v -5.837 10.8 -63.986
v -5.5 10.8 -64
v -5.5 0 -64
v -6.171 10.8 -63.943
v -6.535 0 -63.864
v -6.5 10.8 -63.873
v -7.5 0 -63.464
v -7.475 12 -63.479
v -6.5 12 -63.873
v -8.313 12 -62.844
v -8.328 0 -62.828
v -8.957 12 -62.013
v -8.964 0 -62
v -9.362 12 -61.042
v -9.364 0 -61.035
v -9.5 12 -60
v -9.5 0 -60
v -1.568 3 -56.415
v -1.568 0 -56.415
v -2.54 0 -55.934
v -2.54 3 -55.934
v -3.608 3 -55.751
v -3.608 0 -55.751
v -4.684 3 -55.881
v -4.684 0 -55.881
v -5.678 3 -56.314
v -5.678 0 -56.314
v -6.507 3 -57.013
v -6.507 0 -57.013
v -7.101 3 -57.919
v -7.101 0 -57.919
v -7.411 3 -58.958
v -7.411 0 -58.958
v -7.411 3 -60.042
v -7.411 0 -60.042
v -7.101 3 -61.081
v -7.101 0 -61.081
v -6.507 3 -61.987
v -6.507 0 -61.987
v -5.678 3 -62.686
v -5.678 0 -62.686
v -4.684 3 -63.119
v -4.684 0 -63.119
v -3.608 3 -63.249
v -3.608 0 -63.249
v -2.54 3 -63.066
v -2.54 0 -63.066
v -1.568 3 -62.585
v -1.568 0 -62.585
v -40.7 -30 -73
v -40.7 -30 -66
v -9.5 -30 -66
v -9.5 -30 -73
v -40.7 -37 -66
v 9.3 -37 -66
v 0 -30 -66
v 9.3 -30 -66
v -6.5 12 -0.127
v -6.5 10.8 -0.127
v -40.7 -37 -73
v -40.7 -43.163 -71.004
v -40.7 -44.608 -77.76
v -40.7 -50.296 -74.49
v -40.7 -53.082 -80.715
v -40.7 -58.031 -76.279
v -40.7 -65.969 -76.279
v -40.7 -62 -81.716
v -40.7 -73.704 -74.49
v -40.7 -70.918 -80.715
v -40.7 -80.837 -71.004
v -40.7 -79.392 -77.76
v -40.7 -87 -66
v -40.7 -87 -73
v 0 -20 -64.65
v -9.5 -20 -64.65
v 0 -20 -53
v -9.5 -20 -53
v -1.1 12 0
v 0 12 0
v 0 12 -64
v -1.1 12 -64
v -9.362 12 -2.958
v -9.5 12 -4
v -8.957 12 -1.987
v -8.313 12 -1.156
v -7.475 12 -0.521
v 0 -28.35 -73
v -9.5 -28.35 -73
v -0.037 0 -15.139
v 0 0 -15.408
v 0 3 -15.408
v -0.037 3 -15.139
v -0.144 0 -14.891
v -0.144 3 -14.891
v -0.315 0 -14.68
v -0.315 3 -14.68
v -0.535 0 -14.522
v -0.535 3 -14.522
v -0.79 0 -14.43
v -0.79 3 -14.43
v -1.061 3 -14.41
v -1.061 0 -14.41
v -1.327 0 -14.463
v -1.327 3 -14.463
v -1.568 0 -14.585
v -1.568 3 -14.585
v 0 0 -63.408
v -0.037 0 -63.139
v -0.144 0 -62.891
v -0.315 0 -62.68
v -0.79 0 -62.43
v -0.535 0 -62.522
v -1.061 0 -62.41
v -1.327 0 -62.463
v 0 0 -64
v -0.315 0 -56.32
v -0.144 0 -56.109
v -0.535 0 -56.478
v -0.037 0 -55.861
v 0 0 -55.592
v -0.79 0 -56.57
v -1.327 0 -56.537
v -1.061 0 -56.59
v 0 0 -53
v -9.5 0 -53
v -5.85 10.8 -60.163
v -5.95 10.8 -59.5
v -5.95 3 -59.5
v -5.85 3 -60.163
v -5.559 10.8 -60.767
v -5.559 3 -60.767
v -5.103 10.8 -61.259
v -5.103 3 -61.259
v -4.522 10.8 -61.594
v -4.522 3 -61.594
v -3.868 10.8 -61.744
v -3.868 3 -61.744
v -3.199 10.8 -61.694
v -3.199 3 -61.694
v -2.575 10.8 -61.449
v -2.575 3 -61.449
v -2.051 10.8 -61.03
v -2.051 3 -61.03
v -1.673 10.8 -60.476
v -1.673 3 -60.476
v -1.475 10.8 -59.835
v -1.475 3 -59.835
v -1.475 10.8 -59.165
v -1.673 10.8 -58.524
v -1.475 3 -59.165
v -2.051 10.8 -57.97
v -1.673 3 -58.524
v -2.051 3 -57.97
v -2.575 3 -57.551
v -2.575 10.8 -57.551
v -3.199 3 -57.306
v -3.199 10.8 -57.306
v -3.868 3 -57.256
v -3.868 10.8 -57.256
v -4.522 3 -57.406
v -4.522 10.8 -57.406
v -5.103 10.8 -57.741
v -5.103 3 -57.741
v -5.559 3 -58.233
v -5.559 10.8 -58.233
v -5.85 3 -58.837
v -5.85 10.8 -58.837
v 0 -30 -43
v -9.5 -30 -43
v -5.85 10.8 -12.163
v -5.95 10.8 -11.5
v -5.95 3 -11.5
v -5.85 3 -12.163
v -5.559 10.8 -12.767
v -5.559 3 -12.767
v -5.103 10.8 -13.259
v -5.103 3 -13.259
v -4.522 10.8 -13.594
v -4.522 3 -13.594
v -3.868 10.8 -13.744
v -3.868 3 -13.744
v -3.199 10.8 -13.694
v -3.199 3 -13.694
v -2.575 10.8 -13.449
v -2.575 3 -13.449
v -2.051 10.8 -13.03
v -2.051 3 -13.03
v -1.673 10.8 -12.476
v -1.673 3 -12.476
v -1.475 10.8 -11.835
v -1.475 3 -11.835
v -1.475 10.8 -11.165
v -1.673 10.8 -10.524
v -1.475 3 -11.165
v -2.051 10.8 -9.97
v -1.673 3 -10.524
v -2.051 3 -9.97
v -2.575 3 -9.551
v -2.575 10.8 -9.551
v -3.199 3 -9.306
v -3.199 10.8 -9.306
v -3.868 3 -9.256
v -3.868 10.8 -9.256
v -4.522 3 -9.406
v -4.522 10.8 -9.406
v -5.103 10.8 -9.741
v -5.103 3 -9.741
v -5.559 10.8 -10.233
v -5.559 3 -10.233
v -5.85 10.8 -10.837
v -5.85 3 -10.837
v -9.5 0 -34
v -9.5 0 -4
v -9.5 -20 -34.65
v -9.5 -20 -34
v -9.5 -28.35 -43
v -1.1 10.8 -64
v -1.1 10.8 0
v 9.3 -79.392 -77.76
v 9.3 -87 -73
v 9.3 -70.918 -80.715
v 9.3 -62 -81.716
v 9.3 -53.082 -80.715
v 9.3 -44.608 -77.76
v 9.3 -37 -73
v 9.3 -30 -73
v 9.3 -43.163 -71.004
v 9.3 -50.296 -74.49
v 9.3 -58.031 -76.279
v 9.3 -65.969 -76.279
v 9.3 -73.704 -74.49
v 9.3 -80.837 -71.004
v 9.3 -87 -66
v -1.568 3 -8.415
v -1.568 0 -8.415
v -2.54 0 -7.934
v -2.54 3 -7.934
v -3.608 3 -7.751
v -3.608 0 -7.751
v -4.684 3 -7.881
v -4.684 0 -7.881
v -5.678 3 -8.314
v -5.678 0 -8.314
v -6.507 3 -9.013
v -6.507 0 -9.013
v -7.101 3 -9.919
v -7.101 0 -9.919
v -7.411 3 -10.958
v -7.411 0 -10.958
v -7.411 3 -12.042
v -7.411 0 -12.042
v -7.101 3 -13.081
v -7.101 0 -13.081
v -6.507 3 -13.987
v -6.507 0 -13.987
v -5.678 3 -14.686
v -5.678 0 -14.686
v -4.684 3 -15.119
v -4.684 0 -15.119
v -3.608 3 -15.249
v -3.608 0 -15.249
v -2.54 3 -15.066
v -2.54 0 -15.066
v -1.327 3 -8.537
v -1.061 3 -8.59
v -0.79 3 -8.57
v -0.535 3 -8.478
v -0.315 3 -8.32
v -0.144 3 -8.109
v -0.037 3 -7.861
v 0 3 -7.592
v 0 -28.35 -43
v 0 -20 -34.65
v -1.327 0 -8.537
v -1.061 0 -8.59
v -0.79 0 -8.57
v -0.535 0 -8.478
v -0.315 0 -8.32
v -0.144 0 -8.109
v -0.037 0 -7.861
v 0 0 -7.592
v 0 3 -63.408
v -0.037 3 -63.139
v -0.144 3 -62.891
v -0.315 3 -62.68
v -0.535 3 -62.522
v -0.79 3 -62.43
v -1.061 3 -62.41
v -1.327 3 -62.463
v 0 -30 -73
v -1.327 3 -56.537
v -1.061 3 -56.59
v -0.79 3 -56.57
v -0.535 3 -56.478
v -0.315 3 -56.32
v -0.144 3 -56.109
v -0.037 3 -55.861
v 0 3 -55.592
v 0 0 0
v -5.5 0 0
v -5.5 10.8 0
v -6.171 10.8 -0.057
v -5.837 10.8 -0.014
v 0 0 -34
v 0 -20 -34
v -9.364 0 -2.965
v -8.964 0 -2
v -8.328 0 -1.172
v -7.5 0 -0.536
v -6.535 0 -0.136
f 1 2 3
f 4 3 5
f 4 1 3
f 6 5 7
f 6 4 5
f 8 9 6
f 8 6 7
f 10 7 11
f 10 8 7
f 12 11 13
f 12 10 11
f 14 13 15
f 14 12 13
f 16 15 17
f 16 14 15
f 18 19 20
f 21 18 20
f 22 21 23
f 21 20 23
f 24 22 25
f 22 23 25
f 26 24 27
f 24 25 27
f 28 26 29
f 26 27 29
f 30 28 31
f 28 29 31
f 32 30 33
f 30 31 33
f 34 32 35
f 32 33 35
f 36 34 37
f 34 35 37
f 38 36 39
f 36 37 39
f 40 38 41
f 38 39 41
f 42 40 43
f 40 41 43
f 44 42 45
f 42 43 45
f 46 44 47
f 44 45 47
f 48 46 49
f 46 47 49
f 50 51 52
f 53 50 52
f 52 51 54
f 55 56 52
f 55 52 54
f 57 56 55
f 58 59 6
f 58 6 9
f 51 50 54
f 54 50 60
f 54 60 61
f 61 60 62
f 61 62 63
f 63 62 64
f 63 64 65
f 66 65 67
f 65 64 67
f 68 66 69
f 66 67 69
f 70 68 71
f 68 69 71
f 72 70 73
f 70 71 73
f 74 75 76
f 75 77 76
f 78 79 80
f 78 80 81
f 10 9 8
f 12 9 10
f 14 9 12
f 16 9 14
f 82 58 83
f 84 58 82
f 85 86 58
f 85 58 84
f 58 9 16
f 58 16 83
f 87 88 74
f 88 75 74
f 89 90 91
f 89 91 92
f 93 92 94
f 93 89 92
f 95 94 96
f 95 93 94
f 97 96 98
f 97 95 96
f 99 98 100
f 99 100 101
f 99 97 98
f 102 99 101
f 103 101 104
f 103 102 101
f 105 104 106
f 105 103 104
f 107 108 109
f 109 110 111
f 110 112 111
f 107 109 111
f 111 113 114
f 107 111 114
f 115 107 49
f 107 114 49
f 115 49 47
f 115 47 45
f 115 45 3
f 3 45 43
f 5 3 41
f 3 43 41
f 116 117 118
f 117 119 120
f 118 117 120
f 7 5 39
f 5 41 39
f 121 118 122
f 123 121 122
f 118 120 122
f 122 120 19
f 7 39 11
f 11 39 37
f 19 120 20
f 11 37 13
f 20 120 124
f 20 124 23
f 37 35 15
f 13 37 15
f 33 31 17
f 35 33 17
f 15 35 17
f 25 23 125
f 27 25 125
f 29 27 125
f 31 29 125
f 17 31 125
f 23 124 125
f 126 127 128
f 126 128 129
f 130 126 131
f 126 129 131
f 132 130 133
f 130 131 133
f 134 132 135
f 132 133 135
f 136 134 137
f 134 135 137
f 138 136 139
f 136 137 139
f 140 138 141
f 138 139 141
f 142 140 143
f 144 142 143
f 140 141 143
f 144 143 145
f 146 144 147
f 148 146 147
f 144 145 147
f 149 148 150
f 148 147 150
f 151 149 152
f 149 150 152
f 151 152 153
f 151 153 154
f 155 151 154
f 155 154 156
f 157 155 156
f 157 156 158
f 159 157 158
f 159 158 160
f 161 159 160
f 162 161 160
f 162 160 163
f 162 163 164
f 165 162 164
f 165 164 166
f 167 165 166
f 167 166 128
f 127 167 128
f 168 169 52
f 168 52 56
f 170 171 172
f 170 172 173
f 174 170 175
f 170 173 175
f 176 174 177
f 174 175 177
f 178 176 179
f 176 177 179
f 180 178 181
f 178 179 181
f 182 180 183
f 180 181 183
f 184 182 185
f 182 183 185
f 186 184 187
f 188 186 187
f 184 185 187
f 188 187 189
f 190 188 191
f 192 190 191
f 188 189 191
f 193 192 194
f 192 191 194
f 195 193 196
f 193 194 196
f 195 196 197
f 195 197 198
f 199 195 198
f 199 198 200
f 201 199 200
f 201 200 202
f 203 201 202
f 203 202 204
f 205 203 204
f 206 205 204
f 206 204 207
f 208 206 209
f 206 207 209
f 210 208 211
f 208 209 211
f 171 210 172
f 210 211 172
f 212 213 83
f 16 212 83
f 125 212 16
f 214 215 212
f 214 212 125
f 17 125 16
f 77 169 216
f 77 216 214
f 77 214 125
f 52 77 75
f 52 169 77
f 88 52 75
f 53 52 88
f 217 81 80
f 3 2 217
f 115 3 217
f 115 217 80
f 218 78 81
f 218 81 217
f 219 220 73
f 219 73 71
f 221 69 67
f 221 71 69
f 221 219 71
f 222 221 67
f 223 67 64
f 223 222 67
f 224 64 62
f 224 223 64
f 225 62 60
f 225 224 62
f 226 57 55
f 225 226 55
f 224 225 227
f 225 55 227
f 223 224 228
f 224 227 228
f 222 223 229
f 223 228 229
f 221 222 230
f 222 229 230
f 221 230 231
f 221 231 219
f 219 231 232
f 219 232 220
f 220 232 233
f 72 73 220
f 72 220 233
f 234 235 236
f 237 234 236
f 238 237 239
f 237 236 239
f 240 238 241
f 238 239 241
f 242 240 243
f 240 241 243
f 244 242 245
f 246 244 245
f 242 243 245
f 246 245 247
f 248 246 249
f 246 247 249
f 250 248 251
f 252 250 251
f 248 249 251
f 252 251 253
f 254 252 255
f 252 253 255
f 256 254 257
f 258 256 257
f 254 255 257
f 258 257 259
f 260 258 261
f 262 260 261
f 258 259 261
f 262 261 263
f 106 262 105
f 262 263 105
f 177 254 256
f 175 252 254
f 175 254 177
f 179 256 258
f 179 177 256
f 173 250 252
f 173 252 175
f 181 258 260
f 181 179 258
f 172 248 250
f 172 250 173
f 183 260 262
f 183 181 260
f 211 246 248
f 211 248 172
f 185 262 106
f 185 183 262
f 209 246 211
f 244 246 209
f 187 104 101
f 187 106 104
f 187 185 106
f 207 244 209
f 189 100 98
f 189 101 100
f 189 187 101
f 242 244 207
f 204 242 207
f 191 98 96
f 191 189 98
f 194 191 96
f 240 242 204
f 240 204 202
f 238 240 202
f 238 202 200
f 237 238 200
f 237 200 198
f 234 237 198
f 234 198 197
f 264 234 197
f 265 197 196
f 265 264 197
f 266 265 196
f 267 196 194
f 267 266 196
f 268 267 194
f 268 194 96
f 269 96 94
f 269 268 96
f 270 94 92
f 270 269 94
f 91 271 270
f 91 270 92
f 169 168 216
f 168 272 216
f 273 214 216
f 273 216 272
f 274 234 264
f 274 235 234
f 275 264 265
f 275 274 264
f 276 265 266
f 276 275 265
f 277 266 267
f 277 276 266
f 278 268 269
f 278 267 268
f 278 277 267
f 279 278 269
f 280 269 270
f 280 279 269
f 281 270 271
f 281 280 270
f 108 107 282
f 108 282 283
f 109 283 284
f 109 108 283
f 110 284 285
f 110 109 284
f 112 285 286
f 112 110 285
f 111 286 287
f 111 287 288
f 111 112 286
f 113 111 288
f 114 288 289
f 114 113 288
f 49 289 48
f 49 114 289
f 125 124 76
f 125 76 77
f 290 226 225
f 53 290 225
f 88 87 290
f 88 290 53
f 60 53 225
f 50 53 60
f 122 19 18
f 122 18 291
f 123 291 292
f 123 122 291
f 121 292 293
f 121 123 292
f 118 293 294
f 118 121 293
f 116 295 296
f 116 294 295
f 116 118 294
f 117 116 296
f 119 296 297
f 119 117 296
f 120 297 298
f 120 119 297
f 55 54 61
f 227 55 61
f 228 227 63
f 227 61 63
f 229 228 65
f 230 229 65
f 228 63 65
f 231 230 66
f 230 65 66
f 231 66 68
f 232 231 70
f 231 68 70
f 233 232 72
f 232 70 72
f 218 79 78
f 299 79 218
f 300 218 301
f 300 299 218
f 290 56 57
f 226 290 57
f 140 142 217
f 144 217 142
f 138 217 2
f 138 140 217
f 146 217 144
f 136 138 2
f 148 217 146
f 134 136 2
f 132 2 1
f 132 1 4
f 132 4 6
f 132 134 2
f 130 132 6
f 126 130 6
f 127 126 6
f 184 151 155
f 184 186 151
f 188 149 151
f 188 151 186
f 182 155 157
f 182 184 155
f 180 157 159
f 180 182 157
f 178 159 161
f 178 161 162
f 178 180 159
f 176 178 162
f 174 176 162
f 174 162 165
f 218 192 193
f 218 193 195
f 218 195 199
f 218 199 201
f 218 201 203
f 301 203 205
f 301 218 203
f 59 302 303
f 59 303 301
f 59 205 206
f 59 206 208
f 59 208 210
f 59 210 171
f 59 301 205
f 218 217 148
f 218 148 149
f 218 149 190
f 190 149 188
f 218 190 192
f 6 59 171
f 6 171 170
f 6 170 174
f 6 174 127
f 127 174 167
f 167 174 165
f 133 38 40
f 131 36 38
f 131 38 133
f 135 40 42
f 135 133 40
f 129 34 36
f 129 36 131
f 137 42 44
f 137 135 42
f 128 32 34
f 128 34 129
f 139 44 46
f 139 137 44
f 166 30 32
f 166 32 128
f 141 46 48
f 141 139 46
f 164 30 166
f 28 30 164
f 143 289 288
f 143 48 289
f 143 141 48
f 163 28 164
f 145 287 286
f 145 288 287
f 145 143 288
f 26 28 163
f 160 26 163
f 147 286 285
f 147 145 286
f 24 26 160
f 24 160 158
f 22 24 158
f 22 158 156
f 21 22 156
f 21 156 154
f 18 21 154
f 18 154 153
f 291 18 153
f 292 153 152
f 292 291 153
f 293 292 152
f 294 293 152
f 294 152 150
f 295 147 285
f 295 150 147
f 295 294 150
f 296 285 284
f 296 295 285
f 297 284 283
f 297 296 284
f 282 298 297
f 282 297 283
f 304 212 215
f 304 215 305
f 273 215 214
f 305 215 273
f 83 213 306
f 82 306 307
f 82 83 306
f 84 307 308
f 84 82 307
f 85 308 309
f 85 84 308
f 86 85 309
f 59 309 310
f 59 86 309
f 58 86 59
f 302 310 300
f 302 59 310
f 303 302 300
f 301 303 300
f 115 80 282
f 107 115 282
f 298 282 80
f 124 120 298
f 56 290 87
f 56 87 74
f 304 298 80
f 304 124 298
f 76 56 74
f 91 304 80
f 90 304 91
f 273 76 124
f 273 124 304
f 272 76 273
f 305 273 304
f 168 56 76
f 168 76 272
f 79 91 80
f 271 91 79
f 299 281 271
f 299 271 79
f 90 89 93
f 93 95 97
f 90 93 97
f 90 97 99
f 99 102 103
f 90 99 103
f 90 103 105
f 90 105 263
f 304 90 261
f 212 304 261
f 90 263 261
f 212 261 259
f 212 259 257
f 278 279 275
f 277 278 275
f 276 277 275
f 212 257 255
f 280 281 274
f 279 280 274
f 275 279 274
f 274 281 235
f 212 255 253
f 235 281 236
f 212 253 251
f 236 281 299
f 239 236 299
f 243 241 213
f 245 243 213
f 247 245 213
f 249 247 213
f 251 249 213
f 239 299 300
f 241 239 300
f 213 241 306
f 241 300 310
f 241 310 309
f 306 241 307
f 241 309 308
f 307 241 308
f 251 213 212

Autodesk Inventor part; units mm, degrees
ref_plane "YZ Plane" through (0, 0, 0) normal (1, 0, 0) x (0, 1, 0)
ref_plane "XZ Plane" through (0, 0, 0) normal (0, 1, 0) x (-1, 0, 0)
ref_plane "XY Plane" through (0, 0, 0) normal (0, 0, 1) x (1, 0, 0)
sketch "Sketch1" plane through (0, 0, 0) normal (0, 1, 0) x (-1, 0, 0)
  line L0 (0, 0) -> (9.5, 0)
  line L1 (9.5, 0) -> (9.5, -64)
  line L2 (9.5, -64) -> (0, -64)
  line L3 (0, -64) -> (0, 0)
  circle A0 centre (3.7, -11.5) radius 2.25
  circle A1 centre (3.7, -59.5) radius 2.25
  line L4 (3.7, -11.5) -> (3.7, -59.5) construction
  dimension "d1" = 9.5
  dimension "d2" = 64
  dimension "d3" = 4.5
  dimension "d4" = 48
  dimension "d6" = 3.7
  dimension "d17" = 4.5
extrude "Extrusion1" add sketch "Sketch1" along normal blind 12
sketch "Sketch2" plane through (-9.5, 0, 0) normal (0, 0, 1) x (1, 0, 0)
  line L0 (9.5, 12) -> (0, 12) projected
  line L1 (3, 12) -> (8.4, 12)
  line L2 (8.4, 12) -> (8.4, 10.8)
  line L3 (8.4, 10.8) -> (3, 10.8)
  line L4 (3, 10.8) -> (3, 12)
  line L5 (9.5, 0) -> (9.5, 12) projected
  line L6 (3.55, 0) -> (8.05, 0) projected
  line L7 (3.55, 12) -> (8.05, 12) projected
  line L8 (9.5, 0) -> (9.5, 12) projected
  line L9 (9.5, 0) -> (9.5, 12) projected
  line L10 (3.55, 12) -> (8.05, 12) projected
  line L11 (3.55, 12) -> (3.55, 0) projected
  line L12 (3.55, 12) -> (8.05, 12) projected
  line L13 (3.55, 0) -> (8.05, 0) projected
  line L14 (3.55, 12) -> (8.05, 12) projected
  line L15 (3.55, 0) -> (8.05, 0) projected
  line L16 (3.55, 12) -> (8.05, 12) projected
  line L17 (3.55, 0) -> (8.05, 0) projected
  dimension "d9" = 1.1
  dimension "d10" = 5.4
  dimension "d11" = 1.2
  dimension "d76" = 12
extrude "Extrusion2" cut sketch "Sketch2" against normal up to next
sketch "Sketch3" plane through (0, 0, 0) normal (0, -1, 0) x (1, 0, 0)
  circle A0 centre (-3.7, -11.5) radius 2.25 projected
  circle A1 centre (-3.7, -11.5) radius 3.75
  circle A2 centre (-3.7, -59.5) radius 2.25 projected
  circle A3 centre (-3.7, -59.5) radius 3.75
  point P0 (0, 0)
  dimension "d14" = 7.5
extrude "Extrusion3" cut sketch "Sketch3" against normal blind 3
fillet "Fillet1" radius 1 4 edges at (0, 1.5, -58.8897) (0, 1.5, -60.1103) (0, 1.5, -10.8897) (0, 1.5, -12.1103)
fillet "Fillet2" radius 4 2 edges at (-9.5, 6, -64) (-9.5, 6, 0)
sketch "Sketch28" plane through (0, 0, 0) normal (0, -1, 0) x (1, 0, 0)
  arc A0 (-1.5684, -56.4147) -> (0, -55.592) centre (-1, -55.592) ccw projected
  line L0 (0, -55.592) -> (0, -53)
  line L1 (0, -15.408) -> (0, -55.592) projected
  line L2 (-9.5, -60) -> (-9.5, -4) projected
  line L3 (0, -53) -> (-9.5, -53)
  line L4 (-9.5, -53) -> (-9.5, -34)
  line L5 (-9.5, -34) -> (0, -34)
  line L6 (0, -34) -> (0, -53)
  point P0 (0, 0)
  point P1 (0, -34)
  dimension "d107" = 2.592
  dimension "d108" = 19
extrude "Extrusion19" add sketch "Sketch28" along normal blind 20
sketch "Sketch40" plane through (0, -20, 0) normal (0, -1, 0) x (1, 0, 0)
  line L0 (0, -53) -> (-9.5, -53) projected
  line L1 (-9.5, -53) -> (-9.5, -73)
  line L2 (-9.5, -73) -> (0, -73)
  line L3 (0, -73) -> (0, -43)
  line L4 (0, 0) -> (0, -64) projected
  line L5 (0, -43) -> (-9.5, -43)
  line L6 (-9.5, -43) -> (-9.5, -53)
  line L7 (-9.5, -43) -> (0, -43)
  line L8 (0, -43) -> (0, -73)
  line L9 (0, -73) -> (-9.5, -73)
  line L10 (-9.5, -73) -> (-9.5, -43)
  dimension "d130" = 20
  dimension "d131" = 30
extrude "Extrusion21" add sketch "Sketch40" along normal blind 10
sketch "Sketch41" plane through (0, 0, -53) normal (0, 0, -1) x (-1, 0, 0)
  point P0 (0, 0)
sketch "Sketch42" plane through (0, -30, 0) normal (0, -1, 0) x (1, 0, 0)
  line L0 (-9.5, -73) -> (0, -73) projected
  line L1 (-9.5, -73) -> (-40.7, -73)
  line L2 (-9.5, -73) -> (21.7, -73) construction
  line L3 (-40.7, -73) -> (-40.7, -66)
  line L4 (-40.7, -66) -> (9.3, -66)
  line L5 (9.3, -66) -> (9.3, -73)
  line L6 (9.3, -73) -> (-9.5, -73)
  point P0 (0, 0)
  point P1 (0, -73)
  dimension "d134" = 31.2
  dimension "d135" = 180
  dimension "d136" = 7
  dimension "d137" = 50
  dimension "d138" = 7
extrude "Extrusion22" add sketch "Sketch42" along normal blind 7
sketch "Sketch43" plane through (-40.7, -30, -73) normal (-1, 0, 0) x (0, 0, 1)
  arc A0 (7, -7) -> (7, -57) centre (31.4949, -32) ccw
  point P0 (73, 30)
  dimension "d141" = 50
  dimension "d142" = 35
sketch "Sketch44" plane through (0, -37, 0) normal (0, -1, 0) x (1, 0, 0)
  line L0 (9.3, -73) -> (9.3, -66) projected
  line L1 (-40.7, -73) -> (-9.5, -73) projected
  line L2 (9.3, -66) -> (-40.7, -66)
  line L3 (-40.7, -66) -> (-40.7, -73)
  line L4 (-40.7, -73) -> (9.3, -73)
  line L5 (9.3, -73) -> (9.3, -66)
  point P0 (0, 0)
  point P1 (-9.5, -73)
sweep "Sweep3" add profiles "Sketch44" path "Sketch43"
sketch "Sketch54" plane through (-40.7, -30, -73) normal (-1, 0, 0) x (0, 0, 1)
  arc A0 (7, -7) -> (7, -57) centre (31.4949, -32) ccw projected
  line L0 (-6.4428, -57) -> (19.2704, -57)
  line L1 (19.2704, -57) -> (19.2704, -74.6848)
  line L2 (19.2704, -74.6848) -> (-6.4428, -74.6848)
  line L3 (-6.4428, -74.6848) -> (-6.4428, -57)
  point P0 (73, 30)
extrude "Extrusion25" cut sketch "Sketch54" against normal blind 104.3
chamfer "Chamfer4" distance 8.35 angle 45 1 edges at (-4.75, -20, -43)
chamfer "Chamfer5" distance 8.35 angle 45 1 edges at (-4.75, -20, -73)
properties part number "Back"
